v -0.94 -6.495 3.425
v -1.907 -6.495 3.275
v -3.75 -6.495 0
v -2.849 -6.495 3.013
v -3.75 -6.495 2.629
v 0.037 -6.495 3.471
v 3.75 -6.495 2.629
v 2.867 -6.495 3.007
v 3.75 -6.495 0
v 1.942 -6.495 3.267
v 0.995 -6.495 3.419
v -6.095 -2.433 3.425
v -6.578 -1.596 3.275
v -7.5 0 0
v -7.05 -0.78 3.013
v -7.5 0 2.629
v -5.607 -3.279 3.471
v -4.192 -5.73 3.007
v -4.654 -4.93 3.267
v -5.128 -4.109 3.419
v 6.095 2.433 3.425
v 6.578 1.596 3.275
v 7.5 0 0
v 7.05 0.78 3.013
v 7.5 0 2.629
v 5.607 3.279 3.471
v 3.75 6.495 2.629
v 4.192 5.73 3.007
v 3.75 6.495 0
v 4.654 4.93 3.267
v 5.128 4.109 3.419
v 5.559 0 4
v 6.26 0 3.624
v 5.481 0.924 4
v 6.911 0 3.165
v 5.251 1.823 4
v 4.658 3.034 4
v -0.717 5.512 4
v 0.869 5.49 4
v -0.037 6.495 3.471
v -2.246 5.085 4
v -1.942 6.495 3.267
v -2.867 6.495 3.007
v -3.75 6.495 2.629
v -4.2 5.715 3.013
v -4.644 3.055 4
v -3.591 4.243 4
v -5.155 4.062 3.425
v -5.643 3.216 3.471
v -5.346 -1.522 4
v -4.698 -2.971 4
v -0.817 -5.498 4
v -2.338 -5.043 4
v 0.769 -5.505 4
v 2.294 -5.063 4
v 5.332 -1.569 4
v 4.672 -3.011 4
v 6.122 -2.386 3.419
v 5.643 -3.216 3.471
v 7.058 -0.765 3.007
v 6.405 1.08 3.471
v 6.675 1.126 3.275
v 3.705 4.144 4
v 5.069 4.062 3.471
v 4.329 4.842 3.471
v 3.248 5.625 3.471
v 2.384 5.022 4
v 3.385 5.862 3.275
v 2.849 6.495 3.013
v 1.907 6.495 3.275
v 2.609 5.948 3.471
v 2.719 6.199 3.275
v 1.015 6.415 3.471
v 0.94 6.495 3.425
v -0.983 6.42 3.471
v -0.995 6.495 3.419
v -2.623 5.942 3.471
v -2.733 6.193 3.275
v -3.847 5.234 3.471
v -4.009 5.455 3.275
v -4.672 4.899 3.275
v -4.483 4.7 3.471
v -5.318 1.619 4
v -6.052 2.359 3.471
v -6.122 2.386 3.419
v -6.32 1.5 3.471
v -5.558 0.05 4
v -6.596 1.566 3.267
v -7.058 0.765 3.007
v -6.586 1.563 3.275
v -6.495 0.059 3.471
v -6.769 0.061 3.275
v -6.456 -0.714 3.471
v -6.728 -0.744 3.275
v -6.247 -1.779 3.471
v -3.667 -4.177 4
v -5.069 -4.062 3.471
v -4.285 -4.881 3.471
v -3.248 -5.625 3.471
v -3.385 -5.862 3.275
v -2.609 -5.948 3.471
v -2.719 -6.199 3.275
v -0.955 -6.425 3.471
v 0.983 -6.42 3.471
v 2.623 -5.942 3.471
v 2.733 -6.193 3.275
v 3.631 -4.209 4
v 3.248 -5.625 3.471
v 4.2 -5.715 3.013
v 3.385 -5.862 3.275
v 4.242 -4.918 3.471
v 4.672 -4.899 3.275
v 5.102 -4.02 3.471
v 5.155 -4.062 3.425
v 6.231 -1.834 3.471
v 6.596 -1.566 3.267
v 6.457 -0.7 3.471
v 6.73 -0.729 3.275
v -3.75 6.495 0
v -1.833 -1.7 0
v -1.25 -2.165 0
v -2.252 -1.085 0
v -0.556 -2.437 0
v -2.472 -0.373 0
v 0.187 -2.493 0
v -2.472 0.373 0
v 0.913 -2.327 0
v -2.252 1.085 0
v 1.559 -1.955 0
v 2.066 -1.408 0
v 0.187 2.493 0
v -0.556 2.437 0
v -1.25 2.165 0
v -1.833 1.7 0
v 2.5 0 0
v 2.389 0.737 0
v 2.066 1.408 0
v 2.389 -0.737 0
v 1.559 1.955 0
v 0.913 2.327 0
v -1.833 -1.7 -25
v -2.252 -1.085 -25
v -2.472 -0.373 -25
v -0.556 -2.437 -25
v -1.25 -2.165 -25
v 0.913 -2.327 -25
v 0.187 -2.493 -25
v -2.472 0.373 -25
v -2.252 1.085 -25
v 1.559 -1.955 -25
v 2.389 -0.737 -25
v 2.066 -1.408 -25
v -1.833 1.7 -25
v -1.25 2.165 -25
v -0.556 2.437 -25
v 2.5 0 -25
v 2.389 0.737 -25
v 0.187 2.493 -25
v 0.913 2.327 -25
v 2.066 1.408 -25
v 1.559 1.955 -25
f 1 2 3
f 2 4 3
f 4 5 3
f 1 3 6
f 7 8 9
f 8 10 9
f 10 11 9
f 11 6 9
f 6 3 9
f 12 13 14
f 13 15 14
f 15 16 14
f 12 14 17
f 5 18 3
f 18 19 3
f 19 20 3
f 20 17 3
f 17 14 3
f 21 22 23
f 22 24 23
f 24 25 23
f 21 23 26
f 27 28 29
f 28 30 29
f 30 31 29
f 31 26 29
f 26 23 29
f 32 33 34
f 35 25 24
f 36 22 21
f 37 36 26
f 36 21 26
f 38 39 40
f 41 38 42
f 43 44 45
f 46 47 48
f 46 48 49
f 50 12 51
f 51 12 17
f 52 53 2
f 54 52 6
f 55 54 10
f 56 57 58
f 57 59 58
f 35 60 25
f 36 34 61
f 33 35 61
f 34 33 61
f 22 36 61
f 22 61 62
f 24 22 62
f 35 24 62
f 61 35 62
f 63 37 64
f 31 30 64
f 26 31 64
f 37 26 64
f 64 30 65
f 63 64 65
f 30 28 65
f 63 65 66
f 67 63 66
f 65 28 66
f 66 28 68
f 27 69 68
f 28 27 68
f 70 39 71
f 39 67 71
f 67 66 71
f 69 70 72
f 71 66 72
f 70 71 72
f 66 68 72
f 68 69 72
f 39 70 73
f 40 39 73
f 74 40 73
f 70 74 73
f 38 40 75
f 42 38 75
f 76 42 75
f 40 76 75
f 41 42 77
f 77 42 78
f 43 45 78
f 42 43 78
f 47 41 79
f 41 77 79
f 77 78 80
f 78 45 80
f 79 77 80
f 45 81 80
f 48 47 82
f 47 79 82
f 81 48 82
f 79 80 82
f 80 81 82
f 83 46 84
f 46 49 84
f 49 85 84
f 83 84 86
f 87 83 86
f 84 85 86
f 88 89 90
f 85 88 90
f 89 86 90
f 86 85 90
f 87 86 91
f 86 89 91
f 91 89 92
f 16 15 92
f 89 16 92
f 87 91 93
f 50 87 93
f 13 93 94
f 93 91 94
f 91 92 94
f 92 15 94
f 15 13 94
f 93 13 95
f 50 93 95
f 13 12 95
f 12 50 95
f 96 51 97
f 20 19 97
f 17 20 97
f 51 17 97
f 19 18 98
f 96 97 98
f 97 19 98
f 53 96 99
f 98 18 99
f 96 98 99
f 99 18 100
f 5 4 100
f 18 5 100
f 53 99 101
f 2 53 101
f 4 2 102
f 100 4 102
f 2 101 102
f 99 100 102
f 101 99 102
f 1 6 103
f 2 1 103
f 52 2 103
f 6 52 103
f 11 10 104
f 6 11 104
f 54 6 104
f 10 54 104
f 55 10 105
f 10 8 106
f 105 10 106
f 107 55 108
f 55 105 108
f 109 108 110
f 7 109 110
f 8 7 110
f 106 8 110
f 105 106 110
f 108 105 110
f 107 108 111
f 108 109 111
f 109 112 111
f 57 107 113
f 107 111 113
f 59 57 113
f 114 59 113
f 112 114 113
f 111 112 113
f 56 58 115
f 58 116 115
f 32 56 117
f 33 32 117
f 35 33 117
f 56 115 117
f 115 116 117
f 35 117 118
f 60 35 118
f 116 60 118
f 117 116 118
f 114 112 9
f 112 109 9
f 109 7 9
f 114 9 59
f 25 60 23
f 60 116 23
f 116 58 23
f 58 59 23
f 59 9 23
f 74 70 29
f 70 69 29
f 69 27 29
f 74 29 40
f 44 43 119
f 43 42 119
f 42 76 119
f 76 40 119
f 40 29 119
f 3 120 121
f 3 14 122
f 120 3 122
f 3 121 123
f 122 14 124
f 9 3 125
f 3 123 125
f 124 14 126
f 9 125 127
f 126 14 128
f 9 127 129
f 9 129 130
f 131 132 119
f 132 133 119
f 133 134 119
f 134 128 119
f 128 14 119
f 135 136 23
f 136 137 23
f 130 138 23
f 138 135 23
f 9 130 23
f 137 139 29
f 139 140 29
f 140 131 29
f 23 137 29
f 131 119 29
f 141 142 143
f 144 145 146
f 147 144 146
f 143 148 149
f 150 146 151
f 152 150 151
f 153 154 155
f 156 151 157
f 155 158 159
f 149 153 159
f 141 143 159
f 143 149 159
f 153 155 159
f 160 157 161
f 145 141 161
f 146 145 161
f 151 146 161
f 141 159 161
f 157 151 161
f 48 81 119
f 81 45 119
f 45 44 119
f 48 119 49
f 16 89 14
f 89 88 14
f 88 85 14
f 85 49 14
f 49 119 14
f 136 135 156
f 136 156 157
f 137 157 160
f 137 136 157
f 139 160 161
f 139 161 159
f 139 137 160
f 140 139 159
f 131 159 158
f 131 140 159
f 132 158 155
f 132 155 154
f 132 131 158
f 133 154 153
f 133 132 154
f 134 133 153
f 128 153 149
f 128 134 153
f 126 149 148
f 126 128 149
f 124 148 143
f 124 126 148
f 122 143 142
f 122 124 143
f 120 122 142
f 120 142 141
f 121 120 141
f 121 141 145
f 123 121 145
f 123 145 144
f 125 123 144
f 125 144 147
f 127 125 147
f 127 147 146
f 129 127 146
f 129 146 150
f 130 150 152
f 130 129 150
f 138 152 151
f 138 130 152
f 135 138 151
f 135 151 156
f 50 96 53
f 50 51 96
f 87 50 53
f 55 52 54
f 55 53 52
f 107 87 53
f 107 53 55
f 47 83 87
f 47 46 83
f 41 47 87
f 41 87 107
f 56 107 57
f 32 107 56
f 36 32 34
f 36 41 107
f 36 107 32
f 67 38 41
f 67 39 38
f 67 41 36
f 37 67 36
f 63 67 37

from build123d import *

# Parameters (mm, degrees)
BOSS_EXTRUDE1_DEPTH = 4
SKETCH2_R           = 2.5
BOSS_EXTRUDE2_DEPTH = 25


with BuildPart() as part:
    # Sketch1 → Boss-Extrude1 (new body)
    with BuildSketch(Plane.XY):
        Polygon((7.5, 0), (3.75, 6.495190528), (-3.75, 6.495190528), (-7.5, 0), (-3.75, -6.495190528), (3.75, -6.495190528), align=None)
    extrude(amount=BOSS_EXTRUDE1_DEPTH)

    # Sketch2 → Boss-Extrude2 (add)
    with BuildSketch(Plane.XY):
        Circle(SKETCH2_R)
    extrude(amount=-BOSS_EXTRUDE2_DEPTH)

    # Sketch4 → Cut-Revolve1 (revolve, cut)
    with BuildSketch(Plane(origin=(0, 0, 0), x_dir=(0, 0, -1), z_dir=(1, 0, 0)), mode=Mode.PRIVATE) as cut_revolve1_sk:
        with BuildLine():
            Line((-1.722639627, 8.236577674), (-4.518257709, 8.236577674))
            Line((-4.518257709, 8.236577674), (-4.518257709, 5.392544195))
            Line((-4.518257709, 5.392544195), (-4.073554398, 5.392544195))
            ThreePointArc((-4.073554398, 5.392544195), (-3.104166482, 6.984900617), (-1.722639627, 8.236577674))
        make_face()
    revolve(cut_revolve1_sk.sketch.rotate(Axis((0, 0, 0), (0, 0, 1)), 270), axis=Axis((0, 0, 0), (0, 0, 1)), mode=Mode.SUBTRACT)


solid = part.part
